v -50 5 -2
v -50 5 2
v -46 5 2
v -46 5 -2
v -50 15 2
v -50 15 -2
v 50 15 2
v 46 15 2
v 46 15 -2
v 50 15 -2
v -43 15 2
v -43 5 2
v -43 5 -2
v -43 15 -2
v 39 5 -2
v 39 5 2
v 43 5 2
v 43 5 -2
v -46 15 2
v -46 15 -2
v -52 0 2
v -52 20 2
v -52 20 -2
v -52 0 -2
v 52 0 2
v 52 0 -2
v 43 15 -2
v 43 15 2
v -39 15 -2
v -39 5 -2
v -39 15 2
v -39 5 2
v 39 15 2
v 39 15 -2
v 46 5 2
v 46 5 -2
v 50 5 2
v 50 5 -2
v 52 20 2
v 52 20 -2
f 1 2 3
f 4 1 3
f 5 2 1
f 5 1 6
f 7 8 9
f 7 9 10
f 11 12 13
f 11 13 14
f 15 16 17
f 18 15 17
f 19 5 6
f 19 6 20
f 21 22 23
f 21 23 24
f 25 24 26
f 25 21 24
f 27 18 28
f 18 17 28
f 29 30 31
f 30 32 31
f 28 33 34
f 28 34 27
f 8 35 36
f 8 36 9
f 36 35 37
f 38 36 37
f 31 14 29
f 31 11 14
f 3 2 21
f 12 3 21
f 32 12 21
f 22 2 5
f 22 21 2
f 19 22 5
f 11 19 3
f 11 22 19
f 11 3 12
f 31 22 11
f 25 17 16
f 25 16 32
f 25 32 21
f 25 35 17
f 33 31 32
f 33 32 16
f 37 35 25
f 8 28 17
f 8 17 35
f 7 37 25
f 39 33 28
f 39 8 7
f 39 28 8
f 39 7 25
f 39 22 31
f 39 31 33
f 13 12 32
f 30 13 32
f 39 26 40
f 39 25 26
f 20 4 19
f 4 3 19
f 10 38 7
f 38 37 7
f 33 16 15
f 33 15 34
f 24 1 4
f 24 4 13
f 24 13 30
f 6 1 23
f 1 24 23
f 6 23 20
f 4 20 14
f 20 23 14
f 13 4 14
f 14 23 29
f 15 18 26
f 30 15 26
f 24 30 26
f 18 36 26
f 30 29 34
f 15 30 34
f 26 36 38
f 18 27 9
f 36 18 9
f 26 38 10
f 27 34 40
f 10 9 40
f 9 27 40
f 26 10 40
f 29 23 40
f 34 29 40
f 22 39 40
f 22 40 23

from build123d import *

# Parameters (mm, degrees)
SKETCH_1_W      = 4
SKETCH_1_H      = 10
EXTRUDE_1_DEPTH = 2


with BuildPart() as part:
    # 草图1 → 凸台-拉伸1 (new, symmetric)
    with BuildSketch(Plane.XY):
        Polygon((-46, 0), (46, 0), (52, 0), (52, 20), (46, 20), (-46, 20), (-52, 20), (-52, 0), align=None)
        with Locations((48, 10)):
            Rectangle(SKETCH_1_W, SKETCH_1_H, mode=Mode.SUBTRACT)
        with Locations((-48, 10)):
            Rectangle(SKETCH_1_W, SKETCH_1_H, mode=Mode.SUBTRACT)
        with Locations((41, 10)):
            Rectangle(SKETCH_1_W, SKETCH_1_H, mode=Mode.SUBTRACT)
        with Locations((-41, 10)):
            Rectangle(SKETCH_1_W, SKETCH_1_H, mode=Mode.SUBTRACT)
    extrude(amount=EXTRUDE_1_DEPTH, both=True)


solid = part.part
